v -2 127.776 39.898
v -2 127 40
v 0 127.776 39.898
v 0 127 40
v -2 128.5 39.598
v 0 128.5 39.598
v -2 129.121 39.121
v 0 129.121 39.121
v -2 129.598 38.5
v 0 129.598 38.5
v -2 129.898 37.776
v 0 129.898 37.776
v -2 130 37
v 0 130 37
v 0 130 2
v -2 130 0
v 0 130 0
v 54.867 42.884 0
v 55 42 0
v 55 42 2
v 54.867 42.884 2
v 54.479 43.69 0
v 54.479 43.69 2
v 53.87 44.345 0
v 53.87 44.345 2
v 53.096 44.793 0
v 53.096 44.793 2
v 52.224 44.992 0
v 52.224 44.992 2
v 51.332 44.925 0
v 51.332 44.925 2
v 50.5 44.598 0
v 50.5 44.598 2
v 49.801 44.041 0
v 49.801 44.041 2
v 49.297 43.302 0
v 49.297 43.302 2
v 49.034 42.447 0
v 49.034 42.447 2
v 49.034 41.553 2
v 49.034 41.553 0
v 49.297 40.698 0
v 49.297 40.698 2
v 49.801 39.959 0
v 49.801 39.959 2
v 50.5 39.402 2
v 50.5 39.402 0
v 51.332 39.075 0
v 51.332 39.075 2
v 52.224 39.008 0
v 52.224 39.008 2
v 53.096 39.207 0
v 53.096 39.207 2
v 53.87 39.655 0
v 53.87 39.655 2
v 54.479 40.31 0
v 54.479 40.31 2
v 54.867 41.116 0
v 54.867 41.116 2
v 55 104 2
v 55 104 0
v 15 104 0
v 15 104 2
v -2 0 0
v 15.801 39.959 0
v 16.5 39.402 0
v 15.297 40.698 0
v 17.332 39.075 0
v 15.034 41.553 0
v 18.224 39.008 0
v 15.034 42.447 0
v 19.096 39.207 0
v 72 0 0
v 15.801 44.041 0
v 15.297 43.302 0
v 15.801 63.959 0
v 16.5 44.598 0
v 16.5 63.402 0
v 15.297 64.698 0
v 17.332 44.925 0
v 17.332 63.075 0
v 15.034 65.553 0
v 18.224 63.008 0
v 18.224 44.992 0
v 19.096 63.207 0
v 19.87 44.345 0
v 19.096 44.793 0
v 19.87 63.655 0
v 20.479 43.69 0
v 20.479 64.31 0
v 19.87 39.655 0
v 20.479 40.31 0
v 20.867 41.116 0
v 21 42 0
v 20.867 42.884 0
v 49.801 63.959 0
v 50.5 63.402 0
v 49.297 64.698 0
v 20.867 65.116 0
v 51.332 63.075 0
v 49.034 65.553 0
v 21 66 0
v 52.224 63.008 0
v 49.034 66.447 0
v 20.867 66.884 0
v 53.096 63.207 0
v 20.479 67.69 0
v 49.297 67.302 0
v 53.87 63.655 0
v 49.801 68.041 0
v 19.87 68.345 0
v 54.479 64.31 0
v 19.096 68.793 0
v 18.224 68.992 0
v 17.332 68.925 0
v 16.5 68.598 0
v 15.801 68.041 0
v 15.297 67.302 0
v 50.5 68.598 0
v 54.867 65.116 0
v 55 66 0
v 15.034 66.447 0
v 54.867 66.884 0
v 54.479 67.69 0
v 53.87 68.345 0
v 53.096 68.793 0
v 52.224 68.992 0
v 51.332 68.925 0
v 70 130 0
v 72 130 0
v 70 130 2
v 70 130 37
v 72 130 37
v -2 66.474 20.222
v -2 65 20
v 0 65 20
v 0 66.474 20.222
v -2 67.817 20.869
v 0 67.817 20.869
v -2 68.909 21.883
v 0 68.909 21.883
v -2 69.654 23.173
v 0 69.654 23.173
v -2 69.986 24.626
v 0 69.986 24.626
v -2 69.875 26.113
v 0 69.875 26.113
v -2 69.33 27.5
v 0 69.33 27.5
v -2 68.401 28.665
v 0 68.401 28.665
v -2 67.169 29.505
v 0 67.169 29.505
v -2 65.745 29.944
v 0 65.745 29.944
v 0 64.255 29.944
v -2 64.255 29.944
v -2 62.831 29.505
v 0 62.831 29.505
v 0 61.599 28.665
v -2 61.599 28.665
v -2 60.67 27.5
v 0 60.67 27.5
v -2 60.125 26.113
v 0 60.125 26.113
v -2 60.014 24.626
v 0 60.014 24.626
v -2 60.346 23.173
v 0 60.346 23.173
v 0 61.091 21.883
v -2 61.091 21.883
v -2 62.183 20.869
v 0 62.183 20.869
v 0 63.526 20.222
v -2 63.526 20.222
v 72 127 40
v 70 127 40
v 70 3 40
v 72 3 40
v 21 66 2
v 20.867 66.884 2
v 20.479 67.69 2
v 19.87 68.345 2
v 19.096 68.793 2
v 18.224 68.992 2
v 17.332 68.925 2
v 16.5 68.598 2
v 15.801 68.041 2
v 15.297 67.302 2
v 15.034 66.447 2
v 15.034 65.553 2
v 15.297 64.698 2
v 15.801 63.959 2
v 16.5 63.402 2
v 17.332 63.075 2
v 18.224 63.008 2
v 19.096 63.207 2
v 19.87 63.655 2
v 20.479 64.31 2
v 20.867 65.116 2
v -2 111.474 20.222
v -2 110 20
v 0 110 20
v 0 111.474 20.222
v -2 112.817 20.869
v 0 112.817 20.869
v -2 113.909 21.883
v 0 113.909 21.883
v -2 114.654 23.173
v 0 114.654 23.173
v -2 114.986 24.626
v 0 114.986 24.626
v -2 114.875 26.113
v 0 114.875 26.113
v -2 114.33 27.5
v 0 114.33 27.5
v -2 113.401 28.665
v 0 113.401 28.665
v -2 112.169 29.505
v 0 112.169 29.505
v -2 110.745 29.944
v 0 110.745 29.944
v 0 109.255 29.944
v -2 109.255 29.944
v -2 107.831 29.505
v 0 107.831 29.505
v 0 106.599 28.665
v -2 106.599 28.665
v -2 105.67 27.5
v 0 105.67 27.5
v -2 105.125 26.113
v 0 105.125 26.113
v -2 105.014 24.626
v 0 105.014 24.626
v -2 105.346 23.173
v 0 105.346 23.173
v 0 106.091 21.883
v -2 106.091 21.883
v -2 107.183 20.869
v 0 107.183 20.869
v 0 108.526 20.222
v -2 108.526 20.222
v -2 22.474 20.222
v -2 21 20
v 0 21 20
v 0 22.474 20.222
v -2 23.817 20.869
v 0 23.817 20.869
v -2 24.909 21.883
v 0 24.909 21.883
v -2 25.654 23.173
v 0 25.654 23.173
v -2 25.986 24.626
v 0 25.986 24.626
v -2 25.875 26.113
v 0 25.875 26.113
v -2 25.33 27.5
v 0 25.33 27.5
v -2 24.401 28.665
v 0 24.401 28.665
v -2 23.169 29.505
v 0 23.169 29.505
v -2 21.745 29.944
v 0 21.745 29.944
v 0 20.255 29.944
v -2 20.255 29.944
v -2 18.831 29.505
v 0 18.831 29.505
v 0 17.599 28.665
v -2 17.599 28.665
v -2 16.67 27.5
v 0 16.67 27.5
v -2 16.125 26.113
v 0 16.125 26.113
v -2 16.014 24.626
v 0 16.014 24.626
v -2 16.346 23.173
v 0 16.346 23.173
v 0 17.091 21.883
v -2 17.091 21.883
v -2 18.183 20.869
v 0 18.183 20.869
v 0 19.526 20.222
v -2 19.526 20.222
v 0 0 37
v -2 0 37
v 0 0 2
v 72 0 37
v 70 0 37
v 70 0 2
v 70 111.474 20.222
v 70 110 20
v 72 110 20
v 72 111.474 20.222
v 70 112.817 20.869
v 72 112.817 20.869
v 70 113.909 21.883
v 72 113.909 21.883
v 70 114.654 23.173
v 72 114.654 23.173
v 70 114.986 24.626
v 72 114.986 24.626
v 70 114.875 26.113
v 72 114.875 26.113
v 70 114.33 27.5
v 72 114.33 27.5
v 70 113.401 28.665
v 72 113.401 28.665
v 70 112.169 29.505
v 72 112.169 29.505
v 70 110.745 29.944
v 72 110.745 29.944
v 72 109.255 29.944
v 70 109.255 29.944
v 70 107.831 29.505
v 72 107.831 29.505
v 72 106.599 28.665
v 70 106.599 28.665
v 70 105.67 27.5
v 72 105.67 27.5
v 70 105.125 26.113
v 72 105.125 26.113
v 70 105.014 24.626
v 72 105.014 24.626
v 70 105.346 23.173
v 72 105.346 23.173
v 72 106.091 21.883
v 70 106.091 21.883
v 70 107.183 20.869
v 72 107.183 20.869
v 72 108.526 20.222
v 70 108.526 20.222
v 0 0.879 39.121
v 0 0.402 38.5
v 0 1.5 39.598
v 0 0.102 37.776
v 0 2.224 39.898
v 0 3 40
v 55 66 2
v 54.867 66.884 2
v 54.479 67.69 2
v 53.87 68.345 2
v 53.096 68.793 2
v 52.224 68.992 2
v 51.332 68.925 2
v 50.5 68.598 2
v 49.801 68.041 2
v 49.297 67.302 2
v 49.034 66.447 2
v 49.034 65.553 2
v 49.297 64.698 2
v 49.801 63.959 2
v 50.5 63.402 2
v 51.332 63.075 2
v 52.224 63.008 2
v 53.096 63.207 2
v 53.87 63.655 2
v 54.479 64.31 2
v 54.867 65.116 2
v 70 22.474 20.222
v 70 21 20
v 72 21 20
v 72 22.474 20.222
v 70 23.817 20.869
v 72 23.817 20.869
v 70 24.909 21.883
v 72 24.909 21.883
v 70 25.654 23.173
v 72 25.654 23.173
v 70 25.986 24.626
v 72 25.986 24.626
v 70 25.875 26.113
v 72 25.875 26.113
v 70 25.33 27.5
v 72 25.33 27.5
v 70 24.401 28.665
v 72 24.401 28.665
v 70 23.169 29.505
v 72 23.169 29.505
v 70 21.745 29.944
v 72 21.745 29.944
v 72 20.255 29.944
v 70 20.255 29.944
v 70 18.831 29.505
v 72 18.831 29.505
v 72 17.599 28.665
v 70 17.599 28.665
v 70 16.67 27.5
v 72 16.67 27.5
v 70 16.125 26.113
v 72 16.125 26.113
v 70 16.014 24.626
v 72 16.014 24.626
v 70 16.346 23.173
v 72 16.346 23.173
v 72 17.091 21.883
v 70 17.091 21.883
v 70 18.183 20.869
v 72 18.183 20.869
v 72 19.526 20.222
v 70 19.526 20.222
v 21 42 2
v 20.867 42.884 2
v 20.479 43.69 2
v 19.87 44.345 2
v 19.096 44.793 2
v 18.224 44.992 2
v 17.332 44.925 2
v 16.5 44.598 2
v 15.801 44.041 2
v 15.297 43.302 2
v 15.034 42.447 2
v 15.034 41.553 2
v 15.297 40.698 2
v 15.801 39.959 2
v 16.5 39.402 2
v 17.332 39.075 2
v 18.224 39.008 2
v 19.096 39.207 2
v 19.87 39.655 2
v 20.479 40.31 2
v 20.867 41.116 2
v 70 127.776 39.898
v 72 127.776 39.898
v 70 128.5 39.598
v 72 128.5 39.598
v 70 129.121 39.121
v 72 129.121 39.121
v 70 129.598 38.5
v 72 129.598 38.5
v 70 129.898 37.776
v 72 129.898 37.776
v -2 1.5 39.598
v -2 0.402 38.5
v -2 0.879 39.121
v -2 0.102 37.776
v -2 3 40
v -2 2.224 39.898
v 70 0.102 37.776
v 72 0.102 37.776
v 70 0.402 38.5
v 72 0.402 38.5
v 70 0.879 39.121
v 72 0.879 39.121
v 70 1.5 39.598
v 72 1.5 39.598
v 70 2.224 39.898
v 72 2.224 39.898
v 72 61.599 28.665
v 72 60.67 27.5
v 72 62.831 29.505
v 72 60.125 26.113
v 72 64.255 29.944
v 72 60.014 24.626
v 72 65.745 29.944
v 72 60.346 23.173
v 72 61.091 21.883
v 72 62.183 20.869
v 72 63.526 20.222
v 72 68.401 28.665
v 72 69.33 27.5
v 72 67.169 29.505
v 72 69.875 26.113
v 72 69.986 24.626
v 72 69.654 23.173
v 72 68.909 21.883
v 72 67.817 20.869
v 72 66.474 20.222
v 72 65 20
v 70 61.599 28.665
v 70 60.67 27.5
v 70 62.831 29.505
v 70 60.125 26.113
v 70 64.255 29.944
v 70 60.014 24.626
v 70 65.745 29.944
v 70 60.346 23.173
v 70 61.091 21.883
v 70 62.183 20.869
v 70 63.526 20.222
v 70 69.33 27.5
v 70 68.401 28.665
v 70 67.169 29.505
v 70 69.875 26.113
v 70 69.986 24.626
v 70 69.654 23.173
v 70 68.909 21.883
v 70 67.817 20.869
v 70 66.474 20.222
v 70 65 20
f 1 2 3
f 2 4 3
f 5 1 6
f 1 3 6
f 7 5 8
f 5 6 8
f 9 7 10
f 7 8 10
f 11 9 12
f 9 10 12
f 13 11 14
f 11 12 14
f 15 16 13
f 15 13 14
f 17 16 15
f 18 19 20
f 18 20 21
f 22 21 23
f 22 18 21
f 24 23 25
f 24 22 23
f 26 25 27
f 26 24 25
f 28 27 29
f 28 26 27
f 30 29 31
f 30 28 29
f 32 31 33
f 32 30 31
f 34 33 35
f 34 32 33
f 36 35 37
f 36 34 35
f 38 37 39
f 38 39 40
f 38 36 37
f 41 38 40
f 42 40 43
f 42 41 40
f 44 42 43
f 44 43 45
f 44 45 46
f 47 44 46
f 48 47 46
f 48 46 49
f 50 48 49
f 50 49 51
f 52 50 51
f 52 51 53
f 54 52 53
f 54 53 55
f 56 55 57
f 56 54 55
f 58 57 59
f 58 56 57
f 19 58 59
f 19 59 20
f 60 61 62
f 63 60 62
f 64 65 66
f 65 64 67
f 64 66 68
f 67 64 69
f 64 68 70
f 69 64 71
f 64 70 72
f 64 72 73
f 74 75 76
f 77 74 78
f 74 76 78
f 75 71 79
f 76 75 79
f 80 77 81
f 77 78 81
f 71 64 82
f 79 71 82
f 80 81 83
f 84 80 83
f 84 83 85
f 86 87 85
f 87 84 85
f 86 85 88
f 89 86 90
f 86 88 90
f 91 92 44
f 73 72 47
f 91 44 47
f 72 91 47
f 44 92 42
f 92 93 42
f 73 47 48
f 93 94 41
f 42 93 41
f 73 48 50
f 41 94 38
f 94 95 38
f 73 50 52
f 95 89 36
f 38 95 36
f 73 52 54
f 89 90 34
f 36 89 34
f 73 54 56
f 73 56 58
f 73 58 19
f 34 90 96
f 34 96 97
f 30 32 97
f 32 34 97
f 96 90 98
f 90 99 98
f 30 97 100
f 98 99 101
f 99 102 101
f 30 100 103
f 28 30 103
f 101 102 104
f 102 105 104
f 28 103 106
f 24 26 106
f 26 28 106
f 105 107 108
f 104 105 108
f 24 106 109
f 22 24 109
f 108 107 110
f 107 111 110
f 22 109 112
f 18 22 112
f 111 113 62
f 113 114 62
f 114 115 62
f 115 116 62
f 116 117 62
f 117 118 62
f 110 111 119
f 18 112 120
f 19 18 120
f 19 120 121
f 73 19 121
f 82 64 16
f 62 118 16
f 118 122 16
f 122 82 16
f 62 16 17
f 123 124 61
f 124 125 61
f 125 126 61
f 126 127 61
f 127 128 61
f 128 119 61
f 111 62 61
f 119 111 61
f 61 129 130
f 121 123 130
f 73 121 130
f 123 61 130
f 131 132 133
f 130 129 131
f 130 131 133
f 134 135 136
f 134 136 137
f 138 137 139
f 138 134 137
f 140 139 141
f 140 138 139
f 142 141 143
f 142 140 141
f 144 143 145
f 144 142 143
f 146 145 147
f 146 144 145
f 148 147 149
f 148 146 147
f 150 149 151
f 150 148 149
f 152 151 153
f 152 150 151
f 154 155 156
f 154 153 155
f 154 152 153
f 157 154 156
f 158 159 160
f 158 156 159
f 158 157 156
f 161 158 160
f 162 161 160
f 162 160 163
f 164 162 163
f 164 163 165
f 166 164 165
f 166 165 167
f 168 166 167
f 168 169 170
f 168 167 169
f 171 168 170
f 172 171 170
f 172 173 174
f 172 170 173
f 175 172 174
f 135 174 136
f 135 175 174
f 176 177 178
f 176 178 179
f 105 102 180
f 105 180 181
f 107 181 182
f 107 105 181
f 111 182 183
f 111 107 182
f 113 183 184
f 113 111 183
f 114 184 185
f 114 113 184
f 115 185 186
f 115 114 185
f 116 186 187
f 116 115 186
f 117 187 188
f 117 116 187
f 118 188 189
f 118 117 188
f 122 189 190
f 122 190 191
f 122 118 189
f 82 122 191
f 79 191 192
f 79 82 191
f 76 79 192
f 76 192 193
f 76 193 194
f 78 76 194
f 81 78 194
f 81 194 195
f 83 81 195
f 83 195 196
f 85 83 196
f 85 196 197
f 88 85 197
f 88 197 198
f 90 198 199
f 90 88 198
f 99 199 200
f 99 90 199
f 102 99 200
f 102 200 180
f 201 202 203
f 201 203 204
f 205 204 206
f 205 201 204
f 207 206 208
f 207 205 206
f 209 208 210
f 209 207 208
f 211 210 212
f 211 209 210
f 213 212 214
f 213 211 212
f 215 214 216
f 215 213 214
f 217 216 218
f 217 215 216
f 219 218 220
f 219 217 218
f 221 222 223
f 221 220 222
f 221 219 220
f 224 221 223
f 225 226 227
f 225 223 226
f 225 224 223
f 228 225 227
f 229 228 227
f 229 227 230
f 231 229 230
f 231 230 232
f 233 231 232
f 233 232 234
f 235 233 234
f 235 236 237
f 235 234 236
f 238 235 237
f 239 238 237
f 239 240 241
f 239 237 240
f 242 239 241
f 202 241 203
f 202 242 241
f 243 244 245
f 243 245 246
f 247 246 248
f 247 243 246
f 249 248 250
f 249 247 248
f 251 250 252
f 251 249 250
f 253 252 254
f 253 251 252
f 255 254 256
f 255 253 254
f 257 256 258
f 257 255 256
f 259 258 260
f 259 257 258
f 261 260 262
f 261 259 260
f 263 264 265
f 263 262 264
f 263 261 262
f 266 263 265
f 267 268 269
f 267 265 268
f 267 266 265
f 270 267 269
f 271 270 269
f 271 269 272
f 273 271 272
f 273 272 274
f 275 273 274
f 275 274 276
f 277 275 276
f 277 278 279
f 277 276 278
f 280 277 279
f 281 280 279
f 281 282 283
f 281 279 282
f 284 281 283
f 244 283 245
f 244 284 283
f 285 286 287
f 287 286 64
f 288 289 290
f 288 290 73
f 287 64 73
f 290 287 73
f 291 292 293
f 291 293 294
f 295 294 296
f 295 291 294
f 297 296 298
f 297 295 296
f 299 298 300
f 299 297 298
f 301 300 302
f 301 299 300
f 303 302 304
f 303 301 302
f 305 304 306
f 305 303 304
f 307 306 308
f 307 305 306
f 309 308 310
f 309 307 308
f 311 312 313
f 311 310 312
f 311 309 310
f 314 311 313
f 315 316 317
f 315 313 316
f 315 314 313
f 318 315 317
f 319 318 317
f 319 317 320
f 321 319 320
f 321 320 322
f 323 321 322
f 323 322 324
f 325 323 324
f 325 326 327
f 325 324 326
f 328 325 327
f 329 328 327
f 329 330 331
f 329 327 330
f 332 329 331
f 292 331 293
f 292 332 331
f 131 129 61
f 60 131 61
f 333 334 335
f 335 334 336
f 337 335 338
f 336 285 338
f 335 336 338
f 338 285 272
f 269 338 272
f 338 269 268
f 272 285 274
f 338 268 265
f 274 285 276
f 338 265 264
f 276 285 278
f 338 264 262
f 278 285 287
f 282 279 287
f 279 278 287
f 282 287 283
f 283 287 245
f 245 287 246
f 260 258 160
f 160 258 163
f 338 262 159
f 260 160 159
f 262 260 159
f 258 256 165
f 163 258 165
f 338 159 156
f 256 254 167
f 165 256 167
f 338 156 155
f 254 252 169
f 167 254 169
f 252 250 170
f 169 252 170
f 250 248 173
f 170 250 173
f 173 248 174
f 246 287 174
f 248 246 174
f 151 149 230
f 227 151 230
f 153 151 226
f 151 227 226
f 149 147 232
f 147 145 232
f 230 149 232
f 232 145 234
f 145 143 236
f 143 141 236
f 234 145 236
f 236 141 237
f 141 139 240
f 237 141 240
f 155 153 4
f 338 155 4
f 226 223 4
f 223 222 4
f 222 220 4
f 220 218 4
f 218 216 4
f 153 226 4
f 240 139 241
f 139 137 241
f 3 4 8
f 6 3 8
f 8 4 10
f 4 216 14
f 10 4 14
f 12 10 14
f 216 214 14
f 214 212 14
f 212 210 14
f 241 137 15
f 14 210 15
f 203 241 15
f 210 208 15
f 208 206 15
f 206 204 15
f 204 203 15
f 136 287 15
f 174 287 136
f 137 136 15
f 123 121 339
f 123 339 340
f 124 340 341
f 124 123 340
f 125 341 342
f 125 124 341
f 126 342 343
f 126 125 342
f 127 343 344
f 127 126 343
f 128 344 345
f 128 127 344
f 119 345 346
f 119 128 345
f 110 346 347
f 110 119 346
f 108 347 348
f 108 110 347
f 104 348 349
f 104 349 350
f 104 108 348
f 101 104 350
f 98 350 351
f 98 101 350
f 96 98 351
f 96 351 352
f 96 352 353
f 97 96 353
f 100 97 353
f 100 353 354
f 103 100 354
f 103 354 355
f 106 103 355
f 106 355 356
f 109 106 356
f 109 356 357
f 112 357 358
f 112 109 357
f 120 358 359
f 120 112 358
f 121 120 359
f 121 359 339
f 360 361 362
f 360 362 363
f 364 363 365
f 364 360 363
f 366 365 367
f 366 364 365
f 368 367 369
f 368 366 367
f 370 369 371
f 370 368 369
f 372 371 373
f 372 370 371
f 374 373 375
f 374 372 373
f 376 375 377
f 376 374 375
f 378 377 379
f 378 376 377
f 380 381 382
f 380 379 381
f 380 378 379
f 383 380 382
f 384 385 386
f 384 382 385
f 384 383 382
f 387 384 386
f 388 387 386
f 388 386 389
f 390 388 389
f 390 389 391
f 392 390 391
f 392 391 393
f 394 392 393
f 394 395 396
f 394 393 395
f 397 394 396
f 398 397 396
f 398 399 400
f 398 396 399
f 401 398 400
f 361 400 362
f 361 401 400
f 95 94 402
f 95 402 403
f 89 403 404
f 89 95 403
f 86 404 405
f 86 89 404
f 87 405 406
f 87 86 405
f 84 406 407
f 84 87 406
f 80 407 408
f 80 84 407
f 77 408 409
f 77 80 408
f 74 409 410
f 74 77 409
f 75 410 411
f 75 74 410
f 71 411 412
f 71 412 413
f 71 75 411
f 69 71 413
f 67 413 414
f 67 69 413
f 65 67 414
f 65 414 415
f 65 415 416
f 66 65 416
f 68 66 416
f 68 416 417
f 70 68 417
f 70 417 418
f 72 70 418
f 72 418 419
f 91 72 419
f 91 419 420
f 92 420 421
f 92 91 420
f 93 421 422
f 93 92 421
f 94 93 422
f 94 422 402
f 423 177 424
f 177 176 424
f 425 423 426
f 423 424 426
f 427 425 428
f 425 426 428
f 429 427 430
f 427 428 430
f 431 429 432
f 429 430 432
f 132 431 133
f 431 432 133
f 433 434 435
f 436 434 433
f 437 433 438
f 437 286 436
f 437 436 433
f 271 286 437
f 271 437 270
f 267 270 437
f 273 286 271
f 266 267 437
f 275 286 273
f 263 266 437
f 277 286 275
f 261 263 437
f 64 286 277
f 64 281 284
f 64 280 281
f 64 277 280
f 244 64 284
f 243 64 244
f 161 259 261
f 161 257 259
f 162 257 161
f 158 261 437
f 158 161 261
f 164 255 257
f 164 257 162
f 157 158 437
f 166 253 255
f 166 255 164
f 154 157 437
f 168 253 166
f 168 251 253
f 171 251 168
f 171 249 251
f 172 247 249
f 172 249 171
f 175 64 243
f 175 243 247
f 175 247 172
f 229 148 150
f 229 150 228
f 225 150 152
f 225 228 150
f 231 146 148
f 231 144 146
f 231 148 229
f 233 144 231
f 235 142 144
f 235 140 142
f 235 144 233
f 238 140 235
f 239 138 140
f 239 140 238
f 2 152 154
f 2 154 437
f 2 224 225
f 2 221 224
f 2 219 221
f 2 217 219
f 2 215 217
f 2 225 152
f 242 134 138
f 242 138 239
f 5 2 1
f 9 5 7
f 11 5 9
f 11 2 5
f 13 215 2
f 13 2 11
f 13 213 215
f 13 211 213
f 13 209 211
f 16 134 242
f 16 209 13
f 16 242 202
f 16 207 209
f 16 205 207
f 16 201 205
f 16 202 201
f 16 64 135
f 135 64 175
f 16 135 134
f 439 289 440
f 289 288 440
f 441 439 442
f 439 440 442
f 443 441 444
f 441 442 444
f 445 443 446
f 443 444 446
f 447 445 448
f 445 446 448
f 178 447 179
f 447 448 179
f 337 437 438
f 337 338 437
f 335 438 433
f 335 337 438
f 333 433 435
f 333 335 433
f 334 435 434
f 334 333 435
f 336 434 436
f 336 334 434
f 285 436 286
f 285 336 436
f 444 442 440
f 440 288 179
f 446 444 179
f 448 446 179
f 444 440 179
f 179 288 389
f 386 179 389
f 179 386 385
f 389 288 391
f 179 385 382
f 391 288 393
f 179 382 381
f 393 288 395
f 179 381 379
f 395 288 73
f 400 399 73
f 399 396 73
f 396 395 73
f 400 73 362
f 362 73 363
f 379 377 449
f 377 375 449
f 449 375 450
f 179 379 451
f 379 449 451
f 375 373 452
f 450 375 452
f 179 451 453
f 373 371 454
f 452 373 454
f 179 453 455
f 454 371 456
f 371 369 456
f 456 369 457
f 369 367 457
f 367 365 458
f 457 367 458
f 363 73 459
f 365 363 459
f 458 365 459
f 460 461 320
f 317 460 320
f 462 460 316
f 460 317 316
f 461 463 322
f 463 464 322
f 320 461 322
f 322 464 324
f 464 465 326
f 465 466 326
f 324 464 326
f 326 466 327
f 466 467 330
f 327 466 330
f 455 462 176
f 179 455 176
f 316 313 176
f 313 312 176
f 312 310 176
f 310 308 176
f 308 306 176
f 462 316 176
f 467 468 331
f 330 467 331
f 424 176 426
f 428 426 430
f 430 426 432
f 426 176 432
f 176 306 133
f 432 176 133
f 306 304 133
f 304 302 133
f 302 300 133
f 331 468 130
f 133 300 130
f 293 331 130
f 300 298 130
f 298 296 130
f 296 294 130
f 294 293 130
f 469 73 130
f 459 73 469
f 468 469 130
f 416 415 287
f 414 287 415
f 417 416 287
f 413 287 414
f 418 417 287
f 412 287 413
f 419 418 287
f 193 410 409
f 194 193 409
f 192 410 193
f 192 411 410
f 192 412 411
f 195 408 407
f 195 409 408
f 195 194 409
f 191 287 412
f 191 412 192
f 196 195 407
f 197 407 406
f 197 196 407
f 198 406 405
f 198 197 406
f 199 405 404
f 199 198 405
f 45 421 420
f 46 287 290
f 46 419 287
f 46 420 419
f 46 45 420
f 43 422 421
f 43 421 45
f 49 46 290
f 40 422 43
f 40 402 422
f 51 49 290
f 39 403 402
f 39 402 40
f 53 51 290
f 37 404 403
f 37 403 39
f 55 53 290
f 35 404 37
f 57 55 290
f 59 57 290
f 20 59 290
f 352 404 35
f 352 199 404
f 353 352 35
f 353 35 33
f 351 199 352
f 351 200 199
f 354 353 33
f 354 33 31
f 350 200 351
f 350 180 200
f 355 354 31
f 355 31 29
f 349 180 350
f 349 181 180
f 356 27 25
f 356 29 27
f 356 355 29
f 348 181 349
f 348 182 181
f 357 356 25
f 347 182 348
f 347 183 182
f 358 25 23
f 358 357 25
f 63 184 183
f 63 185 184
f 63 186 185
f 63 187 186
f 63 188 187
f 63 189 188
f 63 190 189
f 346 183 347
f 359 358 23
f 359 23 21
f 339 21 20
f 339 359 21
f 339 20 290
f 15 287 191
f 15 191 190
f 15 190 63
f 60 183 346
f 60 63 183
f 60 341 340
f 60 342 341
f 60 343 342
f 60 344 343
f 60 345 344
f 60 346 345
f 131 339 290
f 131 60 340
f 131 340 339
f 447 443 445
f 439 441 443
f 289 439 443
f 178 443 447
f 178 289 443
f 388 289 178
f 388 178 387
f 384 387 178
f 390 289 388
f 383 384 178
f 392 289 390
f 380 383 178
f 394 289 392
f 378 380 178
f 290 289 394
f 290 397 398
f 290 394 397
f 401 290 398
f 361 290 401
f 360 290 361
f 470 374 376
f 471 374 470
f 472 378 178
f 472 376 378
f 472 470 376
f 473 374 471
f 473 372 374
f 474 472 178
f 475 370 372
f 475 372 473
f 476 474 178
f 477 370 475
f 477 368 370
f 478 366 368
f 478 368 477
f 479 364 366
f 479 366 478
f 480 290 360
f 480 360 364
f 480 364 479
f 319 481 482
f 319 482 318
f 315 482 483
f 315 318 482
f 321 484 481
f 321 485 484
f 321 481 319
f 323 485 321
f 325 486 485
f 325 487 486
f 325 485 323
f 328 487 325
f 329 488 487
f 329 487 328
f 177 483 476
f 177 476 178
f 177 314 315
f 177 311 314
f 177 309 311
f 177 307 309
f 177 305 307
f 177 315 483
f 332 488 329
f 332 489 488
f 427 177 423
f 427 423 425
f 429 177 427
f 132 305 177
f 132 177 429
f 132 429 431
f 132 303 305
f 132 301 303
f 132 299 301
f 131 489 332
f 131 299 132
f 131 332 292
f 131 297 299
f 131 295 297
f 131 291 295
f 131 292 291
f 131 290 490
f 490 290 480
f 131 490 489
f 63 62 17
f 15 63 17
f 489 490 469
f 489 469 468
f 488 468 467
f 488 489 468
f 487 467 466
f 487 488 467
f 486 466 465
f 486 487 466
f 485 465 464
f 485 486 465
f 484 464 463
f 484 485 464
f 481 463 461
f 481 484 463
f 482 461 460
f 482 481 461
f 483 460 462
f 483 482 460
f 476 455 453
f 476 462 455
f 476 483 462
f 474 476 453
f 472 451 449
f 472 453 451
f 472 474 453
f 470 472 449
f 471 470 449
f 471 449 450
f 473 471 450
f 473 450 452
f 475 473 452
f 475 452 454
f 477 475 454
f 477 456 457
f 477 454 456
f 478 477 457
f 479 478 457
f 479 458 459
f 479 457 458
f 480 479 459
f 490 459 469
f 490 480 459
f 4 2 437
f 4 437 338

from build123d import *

# Parameters (mm, degrees)
CYLINDER001_R     = 5
CYLINDER001_DEPTH = 100
CYLINDER002_R     = 5
CYLINDER002_DEPTH = 100
CYLINDER_R        = 5
CYLINDER_DEPTH    = 100
BOX001_W          = 2
BOX001_H          = 130
BOX001_DEPTH      = 40
BOX_W             = 2
BOX_H             = 130
BOX_DEPTH         = 40
SKETCH_R          = 3
EXTRUDE_DEPTH     = 2
FILLET_R          = 3


with BuildPart() as v_lec001:
    # Cylinder001 → Cylinder001 (new body)
    with BuildSketch(Plane(origin=(-10, 65, 25), x_dir=(0, 0, -1), z_dir=(1, 0, 0))):
        Circle(CYLINDER001_R)
    extrude(amount=CYLINDER001_DEPTH)


with BuildPart() as v_lec002:
    # Cylinder002 → Cylinder002 (new body)
    with BuildSketch(Plane(origin=(-10, 21, 25), x_dir=(0, 0, -1), z_dir=(1, 0, 0))):
        Circle(CYLINDER002_R)
    extrude(amount=CYLINDER002_DEPTH)


with BuildPart() as fusion001:
    # Cylinder → Cylinder (new body)
    with BuildSketch(Plane(origin=(-10, 110, 25), x_dir=(0, 0, -1), z_dir=(1, 0, 0))):
        Circle(CYLINDER_R)
    extrude(amount=CYLINDER_DEPTH)

    # Fusion001: union Válec001, Válec002
    add(v_lec001.part)
    add(v_lec002.part)


with BuildPart() as krychle001:
    # Box001 → Box001 (new body)
    with BuildSketch(Plane(origin=(70, 0, 0), x_dir=(1, 0, 0), z_dir=(0, 0, 1))):
        with Locations((1, 65)):
            Rectangle(BOX001_W, BOX001_H)
    extrude(amount=BOX001_DEPTH)


with BuildPart() as cut:
    # Box → Box (new body)
    with BuildSketch(Plane(origin=(-2, 0, 0), x_dir=(1, 0, 0), z_dir=(0, 0, 1))):
        with Locations((1, 65)):
            Rectangle(BOX_W, BOX_H)
    extrude(amount=BOX_DEPTH)

    # Fusion: union Krychle001
    add(krychle001.part)

    # Cut: cut Fusion001
    add(fusion001.part, mode=Mode.SUBTRACT)


with BuildPart() as fillet_body:
    # Sketch → Extrude (new body)
    with BuildSketch(Plane.XY):
        Polygon((0, 130), (0, 0), (70, 0), (70, 130), (55, 104), (15, 104), align=None)
        with Locations((52, 66)):
            Circle(SKETCH_R, mode=Mode.SUBTRACT)
        with Locations((18, 42)):
            Circle(SKETCH_R, mode=Mode.SUBTRACT)
        with Locations((52, 42)):
            Circle(SKETCH_R, mode=Mode.SUBTRACT)
        with Locations((18, 66)):
            Circle(SKETCH_R, mode=Mode.SUBTRACT)
    extrude(amount=EXTRUDE_DEPTH)

    # Fusion002: union Cut
    add(cut.part)

    # Fillet
    fillet_edges = [fillet_body.edges().sort_by_distance(p)[0] for p in [
        (71, 130, 40),
        (71, 0, 40),
        (-1, 130, 40),
        (-1, 0, 40),
    ]]
    fillet(fillet_edges, radius=FILLET_R)


solid = fillet_body.part
